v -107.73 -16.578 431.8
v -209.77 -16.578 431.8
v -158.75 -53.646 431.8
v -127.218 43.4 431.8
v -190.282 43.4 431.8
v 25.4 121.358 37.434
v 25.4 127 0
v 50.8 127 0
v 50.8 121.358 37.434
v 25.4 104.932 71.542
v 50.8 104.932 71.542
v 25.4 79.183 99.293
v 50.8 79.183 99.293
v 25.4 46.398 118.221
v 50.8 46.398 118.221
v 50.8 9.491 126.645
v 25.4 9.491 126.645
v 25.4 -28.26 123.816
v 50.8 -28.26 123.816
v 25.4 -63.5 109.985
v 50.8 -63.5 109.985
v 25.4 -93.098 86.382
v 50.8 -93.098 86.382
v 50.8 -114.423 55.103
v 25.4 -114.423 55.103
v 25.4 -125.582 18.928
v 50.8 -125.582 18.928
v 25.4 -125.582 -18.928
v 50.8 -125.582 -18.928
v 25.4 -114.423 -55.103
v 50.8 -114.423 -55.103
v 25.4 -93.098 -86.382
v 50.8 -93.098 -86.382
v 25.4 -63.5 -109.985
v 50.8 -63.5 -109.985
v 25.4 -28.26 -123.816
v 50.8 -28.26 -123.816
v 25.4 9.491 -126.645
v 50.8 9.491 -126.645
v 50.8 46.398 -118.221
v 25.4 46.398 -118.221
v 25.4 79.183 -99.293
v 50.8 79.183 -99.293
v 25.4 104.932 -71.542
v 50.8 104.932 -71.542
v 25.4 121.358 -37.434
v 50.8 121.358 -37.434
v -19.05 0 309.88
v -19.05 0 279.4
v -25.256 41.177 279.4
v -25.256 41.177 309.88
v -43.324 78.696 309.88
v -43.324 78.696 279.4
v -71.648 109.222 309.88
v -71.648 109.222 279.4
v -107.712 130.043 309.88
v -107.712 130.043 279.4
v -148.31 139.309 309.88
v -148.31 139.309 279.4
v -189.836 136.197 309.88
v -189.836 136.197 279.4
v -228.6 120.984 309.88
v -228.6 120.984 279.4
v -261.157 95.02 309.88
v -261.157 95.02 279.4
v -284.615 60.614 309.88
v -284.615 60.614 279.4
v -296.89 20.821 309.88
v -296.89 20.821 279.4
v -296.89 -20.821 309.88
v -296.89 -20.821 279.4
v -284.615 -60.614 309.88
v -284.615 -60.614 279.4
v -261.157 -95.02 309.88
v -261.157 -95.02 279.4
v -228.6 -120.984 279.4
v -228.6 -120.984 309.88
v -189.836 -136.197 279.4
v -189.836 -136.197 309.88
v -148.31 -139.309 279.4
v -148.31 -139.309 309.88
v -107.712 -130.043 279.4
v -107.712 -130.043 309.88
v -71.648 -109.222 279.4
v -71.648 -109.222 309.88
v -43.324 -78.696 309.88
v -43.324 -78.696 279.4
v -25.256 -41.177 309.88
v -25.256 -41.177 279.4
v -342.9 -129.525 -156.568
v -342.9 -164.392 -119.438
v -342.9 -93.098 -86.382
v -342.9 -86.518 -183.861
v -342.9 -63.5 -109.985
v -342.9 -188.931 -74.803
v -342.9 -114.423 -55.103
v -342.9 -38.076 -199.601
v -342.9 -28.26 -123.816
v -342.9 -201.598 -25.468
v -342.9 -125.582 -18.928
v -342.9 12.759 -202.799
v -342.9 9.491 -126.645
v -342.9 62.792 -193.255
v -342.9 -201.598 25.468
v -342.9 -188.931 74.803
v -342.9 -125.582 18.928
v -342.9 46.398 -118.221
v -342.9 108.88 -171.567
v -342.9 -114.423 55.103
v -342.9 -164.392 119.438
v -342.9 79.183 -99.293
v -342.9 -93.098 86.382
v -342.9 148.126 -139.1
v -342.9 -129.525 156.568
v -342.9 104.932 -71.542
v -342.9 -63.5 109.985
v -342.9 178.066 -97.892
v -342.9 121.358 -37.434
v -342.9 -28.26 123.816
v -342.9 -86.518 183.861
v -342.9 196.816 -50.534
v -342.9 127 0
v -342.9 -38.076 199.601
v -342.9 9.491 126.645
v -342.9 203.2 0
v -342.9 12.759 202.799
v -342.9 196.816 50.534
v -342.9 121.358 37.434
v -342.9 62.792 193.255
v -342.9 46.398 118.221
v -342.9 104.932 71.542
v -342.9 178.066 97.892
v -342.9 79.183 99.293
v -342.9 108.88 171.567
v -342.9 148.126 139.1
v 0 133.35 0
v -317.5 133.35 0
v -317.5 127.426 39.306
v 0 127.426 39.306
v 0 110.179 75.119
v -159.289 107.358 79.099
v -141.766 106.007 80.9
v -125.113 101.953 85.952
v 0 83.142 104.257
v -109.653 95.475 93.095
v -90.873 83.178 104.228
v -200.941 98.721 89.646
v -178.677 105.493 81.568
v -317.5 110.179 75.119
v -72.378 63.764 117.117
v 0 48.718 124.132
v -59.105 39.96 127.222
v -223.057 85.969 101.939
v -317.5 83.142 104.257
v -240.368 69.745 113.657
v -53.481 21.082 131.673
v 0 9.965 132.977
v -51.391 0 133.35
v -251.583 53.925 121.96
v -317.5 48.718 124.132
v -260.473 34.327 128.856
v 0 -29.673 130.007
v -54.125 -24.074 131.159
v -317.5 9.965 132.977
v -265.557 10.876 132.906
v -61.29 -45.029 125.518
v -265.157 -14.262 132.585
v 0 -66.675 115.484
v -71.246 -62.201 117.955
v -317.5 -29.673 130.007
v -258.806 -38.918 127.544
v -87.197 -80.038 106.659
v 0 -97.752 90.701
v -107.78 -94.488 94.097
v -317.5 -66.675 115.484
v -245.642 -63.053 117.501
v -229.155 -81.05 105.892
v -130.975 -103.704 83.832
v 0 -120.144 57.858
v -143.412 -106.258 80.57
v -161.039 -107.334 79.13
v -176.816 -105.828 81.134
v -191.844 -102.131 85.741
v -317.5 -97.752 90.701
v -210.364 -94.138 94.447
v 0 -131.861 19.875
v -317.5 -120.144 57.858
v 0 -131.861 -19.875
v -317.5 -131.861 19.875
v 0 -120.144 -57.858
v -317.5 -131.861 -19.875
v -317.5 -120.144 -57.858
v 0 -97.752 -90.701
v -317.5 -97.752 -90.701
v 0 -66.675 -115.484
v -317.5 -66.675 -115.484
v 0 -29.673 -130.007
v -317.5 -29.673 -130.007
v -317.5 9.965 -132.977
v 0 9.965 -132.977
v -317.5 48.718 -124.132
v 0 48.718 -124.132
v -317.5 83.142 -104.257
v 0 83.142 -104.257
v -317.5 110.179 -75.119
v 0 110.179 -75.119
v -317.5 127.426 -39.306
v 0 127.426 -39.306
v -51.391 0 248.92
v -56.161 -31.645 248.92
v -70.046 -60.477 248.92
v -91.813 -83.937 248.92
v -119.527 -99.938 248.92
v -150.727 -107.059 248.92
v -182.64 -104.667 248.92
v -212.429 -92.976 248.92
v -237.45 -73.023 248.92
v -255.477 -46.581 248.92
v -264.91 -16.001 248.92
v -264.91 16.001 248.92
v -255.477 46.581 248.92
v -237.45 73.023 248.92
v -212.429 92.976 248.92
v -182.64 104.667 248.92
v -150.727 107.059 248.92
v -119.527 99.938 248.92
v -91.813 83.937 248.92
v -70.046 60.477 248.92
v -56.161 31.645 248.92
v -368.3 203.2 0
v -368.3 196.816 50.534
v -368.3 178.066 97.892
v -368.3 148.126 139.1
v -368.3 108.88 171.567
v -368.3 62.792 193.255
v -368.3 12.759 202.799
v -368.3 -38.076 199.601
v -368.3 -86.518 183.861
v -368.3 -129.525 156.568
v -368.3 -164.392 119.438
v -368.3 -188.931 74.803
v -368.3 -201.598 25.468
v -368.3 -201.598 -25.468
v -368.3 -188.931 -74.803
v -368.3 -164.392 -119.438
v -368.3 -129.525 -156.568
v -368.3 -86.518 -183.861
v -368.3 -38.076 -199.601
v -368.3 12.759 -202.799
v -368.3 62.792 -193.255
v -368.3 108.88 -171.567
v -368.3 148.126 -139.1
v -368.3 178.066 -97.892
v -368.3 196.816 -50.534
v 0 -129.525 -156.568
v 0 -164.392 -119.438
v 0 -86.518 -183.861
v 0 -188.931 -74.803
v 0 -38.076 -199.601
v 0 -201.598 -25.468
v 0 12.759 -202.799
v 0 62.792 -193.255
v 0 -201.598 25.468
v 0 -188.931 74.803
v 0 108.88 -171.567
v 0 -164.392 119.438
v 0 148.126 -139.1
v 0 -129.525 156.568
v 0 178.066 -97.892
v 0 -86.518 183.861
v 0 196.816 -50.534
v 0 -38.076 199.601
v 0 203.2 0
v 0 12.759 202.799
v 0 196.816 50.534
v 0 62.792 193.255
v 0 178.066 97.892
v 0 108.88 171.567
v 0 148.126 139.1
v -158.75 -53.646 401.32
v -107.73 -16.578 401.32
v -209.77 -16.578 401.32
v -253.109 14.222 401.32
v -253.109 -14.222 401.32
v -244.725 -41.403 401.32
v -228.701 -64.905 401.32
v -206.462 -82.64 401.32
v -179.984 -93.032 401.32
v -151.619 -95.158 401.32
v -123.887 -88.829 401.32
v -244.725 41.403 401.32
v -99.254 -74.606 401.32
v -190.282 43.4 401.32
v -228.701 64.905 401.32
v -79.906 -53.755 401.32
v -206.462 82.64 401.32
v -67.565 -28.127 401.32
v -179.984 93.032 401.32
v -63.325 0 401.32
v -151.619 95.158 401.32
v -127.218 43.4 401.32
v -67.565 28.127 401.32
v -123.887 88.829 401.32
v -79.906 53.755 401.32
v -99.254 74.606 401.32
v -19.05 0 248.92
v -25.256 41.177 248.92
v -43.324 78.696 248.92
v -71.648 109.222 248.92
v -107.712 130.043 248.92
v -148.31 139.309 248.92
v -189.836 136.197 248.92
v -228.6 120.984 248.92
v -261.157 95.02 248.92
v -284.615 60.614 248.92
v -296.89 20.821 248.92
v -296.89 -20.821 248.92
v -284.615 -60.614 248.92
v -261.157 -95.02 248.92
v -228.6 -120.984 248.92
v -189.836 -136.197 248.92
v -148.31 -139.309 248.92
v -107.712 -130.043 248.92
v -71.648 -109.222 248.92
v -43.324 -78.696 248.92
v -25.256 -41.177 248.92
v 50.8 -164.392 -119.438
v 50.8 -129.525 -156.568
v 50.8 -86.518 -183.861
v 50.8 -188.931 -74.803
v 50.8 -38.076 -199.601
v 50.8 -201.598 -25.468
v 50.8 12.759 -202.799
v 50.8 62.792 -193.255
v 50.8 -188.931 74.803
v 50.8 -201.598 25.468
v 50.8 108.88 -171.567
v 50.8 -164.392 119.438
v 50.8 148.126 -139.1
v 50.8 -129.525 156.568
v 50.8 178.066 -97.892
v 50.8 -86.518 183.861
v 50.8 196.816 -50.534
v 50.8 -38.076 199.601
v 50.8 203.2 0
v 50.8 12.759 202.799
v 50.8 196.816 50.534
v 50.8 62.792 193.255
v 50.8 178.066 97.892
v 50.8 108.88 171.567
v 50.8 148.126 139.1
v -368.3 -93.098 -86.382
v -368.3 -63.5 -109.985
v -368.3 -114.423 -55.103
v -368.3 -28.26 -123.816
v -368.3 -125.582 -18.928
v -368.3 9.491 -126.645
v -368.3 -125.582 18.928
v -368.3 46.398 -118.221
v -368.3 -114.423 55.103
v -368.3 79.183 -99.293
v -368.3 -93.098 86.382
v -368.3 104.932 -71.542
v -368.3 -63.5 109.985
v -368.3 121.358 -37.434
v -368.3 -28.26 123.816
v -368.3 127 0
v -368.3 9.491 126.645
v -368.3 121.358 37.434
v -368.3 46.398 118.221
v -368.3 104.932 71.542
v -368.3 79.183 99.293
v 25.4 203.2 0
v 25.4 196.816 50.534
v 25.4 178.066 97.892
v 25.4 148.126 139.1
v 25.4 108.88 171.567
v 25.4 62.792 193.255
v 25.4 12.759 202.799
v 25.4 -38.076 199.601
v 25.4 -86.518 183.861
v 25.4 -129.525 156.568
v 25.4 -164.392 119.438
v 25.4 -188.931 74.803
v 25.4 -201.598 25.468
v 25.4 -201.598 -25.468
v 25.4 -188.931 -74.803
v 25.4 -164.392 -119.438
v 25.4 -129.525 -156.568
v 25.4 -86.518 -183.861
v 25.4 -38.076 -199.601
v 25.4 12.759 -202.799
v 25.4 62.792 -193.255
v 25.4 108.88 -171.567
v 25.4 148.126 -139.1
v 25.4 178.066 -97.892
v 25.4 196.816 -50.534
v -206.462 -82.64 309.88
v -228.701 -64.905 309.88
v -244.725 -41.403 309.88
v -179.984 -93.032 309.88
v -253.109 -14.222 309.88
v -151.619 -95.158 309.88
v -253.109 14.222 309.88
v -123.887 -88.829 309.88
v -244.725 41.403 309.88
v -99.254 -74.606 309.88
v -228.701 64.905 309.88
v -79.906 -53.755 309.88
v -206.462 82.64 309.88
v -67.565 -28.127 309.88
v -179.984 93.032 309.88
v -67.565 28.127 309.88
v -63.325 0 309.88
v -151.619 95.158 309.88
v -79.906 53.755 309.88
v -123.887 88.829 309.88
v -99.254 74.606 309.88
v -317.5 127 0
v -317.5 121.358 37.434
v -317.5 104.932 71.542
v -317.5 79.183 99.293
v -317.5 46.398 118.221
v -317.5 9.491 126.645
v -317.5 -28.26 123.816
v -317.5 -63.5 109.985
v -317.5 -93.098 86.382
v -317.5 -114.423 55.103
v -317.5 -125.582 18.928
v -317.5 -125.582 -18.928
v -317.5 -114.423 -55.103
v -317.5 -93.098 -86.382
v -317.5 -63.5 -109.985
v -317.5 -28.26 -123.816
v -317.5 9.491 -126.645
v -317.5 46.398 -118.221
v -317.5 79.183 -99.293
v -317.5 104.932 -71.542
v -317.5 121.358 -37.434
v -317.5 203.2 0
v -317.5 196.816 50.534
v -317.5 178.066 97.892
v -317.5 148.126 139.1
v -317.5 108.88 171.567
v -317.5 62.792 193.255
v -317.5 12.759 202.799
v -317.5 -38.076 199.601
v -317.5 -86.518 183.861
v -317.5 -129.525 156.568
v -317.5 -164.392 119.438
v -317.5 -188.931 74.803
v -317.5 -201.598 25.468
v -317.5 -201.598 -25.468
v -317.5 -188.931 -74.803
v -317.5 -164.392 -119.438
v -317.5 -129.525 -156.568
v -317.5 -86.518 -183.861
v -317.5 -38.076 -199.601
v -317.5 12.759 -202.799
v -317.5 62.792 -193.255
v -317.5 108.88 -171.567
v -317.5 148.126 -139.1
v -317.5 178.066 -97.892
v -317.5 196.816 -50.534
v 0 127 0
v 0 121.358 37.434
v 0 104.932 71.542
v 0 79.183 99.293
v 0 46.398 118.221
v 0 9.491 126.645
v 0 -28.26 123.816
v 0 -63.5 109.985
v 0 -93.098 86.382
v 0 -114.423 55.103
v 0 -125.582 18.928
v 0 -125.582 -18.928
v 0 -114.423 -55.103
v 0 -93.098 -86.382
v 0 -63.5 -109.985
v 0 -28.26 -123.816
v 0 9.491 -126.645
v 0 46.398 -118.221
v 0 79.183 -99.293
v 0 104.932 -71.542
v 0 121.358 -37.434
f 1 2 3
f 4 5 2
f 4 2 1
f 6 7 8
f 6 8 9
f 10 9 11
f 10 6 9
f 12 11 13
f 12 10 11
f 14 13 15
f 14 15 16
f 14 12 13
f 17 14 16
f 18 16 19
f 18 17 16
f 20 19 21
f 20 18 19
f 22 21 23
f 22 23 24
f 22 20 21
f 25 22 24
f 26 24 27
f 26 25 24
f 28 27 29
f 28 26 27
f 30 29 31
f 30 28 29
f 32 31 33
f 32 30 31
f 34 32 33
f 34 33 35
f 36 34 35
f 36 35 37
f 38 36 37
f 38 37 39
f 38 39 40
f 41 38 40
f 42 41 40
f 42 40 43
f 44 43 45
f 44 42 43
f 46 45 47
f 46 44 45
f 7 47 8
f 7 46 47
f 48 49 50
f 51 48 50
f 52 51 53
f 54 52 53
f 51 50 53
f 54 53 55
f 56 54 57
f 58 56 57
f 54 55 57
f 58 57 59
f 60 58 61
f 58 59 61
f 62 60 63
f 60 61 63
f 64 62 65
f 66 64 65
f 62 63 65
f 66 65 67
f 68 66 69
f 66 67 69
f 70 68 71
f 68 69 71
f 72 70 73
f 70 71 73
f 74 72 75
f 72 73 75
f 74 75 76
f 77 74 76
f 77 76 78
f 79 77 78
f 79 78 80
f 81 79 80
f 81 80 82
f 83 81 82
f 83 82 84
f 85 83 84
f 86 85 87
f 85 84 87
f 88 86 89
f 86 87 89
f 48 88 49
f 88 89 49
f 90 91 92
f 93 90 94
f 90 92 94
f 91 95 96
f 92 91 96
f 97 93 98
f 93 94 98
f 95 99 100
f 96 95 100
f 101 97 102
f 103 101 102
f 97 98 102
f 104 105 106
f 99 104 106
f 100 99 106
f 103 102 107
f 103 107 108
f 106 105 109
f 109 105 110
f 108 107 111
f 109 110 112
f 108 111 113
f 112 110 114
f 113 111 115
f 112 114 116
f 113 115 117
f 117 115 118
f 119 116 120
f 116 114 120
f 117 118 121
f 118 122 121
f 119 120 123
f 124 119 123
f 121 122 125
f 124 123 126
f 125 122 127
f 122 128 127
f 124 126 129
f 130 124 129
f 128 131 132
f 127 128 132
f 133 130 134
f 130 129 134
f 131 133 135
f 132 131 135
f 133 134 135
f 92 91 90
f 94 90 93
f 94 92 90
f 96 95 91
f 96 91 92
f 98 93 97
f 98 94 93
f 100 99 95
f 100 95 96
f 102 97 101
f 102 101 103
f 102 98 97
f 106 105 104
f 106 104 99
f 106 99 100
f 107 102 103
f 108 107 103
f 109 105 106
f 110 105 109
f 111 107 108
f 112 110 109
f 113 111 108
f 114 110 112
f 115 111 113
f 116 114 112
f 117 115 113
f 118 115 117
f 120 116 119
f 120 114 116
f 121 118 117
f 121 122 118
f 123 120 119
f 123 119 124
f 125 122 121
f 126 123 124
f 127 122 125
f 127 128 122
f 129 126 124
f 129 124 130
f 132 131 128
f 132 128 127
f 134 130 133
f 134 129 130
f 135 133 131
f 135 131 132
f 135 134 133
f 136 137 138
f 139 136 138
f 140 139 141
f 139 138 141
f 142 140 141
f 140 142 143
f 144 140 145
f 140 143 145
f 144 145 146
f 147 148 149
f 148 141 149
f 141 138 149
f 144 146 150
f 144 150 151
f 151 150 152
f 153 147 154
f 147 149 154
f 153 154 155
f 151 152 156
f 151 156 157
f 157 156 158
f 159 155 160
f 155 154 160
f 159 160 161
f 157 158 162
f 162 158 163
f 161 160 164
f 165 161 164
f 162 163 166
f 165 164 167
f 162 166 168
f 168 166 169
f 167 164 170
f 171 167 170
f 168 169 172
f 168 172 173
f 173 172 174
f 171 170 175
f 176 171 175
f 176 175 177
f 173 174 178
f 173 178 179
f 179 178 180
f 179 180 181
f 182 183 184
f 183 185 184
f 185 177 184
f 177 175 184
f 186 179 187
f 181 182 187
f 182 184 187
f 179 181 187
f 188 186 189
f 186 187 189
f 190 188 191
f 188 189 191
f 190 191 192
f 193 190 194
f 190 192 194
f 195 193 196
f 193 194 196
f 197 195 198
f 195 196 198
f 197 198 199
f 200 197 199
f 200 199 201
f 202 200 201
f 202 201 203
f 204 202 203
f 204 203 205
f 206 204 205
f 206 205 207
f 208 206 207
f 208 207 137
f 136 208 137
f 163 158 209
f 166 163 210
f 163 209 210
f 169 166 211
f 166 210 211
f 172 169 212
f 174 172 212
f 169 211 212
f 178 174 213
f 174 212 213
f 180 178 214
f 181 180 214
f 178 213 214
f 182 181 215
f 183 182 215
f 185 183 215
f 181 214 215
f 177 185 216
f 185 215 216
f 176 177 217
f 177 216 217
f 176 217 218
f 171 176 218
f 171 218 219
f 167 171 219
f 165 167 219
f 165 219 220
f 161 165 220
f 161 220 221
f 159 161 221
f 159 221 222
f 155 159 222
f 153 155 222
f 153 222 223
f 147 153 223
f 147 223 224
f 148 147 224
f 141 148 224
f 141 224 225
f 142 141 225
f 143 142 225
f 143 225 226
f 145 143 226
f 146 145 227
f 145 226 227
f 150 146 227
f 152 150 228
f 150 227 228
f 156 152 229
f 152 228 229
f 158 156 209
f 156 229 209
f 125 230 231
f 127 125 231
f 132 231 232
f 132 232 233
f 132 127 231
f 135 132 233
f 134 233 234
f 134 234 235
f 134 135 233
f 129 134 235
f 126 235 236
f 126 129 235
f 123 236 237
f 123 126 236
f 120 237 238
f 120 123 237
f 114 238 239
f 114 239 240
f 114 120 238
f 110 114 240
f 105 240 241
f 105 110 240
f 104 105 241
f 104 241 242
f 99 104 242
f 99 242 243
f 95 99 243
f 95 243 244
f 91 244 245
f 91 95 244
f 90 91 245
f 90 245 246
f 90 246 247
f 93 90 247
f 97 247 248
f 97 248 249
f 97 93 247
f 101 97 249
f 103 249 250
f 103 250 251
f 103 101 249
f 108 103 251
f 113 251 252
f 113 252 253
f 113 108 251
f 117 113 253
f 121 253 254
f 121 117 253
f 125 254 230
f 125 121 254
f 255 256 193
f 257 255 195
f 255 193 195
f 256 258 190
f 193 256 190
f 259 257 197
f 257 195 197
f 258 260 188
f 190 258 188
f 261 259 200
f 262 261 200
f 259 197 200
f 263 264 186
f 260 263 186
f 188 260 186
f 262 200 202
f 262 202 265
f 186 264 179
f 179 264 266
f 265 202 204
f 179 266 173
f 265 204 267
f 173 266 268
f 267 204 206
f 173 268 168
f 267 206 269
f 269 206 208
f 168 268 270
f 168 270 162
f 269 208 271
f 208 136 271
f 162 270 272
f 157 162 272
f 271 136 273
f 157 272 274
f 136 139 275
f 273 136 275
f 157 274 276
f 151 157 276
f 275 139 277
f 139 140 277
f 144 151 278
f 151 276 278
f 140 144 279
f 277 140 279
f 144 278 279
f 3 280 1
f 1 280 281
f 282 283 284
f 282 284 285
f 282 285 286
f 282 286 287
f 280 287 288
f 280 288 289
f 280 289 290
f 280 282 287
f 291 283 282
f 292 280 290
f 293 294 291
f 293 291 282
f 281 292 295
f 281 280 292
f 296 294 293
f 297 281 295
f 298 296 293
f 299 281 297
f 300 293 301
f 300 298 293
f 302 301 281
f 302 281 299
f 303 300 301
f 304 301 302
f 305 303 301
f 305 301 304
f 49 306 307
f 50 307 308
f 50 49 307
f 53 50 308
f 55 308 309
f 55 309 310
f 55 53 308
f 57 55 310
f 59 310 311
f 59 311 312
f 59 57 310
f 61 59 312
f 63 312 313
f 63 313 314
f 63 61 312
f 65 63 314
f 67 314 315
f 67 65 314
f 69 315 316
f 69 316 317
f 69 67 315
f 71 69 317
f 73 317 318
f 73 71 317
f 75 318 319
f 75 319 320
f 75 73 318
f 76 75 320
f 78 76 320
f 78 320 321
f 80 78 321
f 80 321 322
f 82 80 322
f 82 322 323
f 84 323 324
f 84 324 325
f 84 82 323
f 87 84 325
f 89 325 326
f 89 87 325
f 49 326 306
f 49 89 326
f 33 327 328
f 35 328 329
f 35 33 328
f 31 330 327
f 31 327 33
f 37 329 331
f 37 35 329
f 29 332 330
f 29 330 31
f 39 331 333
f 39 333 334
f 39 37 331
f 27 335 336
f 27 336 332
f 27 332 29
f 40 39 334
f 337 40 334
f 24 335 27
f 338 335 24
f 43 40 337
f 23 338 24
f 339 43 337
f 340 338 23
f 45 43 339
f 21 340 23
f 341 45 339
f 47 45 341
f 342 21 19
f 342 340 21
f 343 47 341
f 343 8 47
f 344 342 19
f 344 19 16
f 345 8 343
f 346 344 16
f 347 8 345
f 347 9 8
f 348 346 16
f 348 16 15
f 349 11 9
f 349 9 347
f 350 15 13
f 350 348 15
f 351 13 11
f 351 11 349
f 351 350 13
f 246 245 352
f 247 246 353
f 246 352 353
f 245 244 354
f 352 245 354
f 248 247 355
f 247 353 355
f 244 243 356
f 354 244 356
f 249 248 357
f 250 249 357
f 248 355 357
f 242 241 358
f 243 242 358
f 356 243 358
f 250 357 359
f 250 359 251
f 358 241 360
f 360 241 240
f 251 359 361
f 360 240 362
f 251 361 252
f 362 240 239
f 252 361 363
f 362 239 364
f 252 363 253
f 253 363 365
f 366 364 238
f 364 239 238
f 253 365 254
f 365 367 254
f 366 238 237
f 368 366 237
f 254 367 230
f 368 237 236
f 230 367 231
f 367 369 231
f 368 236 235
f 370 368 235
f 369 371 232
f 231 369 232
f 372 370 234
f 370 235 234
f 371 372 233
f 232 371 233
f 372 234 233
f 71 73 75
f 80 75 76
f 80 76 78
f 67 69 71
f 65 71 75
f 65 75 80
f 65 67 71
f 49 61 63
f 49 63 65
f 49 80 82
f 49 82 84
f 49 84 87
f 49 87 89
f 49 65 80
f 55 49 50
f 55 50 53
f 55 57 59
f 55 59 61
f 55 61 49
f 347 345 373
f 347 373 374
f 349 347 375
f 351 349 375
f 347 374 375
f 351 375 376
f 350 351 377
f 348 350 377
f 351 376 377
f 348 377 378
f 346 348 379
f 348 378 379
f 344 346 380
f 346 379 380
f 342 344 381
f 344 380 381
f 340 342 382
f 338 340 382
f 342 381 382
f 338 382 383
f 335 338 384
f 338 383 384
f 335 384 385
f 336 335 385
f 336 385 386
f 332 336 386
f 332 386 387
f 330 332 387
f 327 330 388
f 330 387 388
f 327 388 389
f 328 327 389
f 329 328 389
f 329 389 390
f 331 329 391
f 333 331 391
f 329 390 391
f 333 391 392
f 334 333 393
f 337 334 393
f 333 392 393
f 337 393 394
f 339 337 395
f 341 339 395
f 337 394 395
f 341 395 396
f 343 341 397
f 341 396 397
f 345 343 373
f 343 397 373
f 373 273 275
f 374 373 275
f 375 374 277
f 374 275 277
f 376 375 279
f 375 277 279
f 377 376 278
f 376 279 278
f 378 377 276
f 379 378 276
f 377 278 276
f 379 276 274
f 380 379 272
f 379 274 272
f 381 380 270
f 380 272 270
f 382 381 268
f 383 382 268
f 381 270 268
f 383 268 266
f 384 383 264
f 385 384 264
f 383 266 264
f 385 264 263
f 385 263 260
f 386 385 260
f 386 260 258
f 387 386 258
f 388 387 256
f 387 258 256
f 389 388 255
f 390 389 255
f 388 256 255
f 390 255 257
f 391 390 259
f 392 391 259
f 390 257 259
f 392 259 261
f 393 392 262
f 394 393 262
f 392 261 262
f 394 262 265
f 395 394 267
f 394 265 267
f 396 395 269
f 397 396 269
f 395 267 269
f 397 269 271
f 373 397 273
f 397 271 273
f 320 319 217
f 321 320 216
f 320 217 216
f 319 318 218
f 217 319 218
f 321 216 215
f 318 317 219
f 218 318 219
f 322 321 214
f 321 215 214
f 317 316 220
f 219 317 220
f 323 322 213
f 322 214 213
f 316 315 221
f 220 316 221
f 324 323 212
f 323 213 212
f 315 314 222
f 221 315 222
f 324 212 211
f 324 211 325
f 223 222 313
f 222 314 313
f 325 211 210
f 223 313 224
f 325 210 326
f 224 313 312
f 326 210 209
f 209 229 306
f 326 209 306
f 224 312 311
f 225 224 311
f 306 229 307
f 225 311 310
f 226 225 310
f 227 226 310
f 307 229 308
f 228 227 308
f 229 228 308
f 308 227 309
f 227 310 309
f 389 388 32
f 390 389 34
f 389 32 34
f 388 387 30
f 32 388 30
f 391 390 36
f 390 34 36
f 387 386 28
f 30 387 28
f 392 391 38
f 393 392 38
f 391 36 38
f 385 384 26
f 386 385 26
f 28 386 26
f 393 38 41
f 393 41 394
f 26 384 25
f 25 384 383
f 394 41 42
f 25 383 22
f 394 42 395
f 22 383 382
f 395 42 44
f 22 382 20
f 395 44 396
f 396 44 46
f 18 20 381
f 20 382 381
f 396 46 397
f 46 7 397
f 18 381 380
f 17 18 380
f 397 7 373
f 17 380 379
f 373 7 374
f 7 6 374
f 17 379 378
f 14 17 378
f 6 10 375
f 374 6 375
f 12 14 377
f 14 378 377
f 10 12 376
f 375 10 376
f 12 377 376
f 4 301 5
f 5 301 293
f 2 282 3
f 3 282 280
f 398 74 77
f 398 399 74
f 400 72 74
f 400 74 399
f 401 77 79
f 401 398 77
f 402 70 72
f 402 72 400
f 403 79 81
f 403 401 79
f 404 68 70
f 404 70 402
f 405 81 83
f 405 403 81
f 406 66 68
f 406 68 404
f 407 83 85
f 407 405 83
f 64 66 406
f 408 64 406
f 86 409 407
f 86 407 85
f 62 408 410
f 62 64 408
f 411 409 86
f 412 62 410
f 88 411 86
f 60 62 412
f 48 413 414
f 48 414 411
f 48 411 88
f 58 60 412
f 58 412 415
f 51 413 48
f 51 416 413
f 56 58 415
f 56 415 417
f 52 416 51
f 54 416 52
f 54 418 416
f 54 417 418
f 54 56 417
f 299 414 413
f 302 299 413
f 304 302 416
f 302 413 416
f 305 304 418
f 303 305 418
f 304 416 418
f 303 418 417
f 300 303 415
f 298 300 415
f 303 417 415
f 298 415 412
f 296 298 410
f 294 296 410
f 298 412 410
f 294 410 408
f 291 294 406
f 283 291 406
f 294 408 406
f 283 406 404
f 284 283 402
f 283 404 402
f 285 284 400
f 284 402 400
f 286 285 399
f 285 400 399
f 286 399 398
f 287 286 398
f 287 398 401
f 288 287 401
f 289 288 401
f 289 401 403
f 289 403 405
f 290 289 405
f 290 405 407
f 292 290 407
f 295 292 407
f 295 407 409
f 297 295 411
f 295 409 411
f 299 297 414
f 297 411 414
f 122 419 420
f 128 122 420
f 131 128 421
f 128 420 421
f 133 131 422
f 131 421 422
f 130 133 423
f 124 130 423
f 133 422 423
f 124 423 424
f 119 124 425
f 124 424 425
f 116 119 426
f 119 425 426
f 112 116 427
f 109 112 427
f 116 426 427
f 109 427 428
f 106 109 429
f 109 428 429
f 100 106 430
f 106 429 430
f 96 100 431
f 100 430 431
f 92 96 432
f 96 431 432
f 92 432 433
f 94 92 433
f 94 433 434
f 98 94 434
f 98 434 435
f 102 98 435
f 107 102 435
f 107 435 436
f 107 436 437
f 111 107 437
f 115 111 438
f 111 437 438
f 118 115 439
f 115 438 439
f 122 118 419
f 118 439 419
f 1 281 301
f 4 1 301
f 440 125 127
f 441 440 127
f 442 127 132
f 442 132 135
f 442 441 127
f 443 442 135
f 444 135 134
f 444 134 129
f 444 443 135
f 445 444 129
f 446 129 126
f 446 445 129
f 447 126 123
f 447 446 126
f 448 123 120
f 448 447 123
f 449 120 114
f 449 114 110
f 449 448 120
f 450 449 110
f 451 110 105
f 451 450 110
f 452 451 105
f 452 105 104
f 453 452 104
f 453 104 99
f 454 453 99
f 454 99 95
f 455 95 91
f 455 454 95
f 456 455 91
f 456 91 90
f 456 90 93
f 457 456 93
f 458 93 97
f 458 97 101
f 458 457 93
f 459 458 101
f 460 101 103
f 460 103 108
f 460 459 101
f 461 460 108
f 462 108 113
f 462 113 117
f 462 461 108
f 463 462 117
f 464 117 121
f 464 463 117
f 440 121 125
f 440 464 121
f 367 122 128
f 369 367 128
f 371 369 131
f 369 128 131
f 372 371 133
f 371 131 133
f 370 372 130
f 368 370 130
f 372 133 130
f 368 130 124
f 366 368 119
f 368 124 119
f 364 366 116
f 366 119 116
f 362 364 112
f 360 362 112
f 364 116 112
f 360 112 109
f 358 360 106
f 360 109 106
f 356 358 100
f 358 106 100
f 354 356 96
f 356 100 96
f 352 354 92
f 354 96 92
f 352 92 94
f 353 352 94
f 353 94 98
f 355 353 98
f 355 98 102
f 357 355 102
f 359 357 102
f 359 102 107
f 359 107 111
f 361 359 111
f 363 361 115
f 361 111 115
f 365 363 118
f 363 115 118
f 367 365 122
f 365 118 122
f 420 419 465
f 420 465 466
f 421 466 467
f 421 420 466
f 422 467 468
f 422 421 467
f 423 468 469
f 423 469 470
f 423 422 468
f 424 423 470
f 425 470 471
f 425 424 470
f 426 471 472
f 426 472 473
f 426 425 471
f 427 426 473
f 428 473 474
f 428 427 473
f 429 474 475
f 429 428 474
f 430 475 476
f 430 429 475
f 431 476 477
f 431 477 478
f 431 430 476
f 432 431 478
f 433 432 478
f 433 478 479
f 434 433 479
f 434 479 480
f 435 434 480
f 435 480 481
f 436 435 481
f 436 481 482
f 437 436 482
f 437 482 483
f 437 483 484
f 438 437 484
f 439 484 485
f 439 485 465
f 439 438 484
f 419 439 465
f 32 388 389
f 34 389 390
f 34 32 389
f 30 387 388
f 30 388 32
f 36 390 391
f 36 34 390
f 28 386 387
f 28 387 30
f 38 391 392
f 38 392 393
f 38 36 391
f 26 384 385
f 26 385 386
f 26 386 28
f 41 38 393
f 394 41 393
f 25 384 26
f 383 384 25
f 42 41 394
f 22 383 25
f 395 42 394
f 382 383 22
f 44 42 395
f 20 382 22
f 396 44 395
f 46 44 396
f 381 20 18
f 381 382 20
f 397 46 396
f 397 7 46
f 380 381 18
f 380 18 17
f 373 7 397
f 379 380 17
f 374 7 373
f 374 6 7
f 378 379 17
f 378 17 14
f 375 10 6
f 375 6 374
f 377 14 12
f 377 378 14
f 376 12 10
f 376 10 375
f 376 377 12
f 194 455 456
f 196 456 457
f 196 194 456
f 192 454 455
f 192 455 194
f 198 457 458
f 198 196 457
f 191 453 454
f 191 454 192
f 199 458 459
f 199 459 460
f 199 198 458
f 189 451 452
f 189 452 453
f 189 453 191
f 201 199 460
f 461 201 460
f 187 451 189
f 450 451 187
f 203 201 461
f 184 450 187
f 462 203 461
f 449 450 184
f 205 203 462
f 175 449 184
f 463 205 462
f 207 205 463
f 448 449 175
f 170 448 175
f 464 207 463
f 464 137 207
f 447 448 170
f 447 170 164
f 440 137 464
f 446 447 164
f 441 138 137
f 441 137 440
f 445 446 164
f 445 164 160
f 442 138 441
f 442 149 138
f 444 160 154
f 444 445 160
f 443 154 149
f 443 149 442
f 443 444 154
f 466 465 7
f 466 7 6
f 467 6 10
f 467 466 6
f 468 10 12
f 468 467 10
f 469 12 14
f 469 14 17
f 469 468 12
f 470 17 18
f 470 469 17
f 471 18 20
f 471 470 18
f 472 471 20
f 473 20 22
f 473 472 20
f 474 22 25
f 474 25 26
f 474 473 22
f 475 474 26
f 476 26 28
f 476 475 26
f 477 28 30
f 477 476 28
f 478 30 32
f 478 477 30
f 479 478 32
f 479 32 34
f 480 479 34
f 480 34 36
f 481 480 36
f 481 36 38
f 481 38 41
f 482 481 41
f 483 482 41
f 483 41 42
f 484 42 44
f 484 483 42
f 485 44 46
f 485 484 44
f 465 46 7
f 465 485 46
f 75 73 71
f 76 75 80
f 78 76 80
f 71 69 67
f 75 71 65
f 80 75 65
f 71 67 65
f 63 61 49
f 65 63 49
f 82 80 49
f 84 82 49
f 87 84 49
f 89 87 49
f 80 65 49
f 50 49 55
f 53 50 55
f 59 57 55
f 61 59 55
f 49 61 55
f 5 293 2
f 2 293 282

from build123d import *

# Parameters (mm, degrees)
F0_R      = 203.2
F0_R_2    = 127
F1_DEPTH  = 25.4
F3_R      = 203.2
F3_R_2    = 127
F4_DEPTH  = 25.4
F6_DEPTH  = 25.4
F7_DEPTH  = 25.4
F9_R      = 133.35
F9_R_2    = 127
F10_DEPTH = 317.5
F12_R     = 139.7
F13_DEPTH = 30.48
F14_R     = 107.3588969204
F15_REACH = 755.7778161324
F16_DEPTH = 30.48
F17_R     = 95.4249040927
F18_DEPTH = 91.44
F20_DEPTH = 30.48


with BuildPart() as f1:
    # F0 (on Right) → F1 (new body)
    with BuildSketch(Plane.YZ):
        Circle(F0_R)
        Circle(F0_R_2, mode=Mode.SUBTRACT)
    extrude(amount=F1_DEPTH)


with BuildPart() as f4:
    # F3 (on offset) → F4 (new body)
    with BuildSketch(Plane.YZ.offset(-317.5)):
        Circle(F3_R)
        Circle(F3_R_2, mode=Mode.SUBTRACT)
    extrude(amount=-F4_DEPTH)


with BuildPart() as f6:
    # F6 (new): a face of the model
    f6_faces = [f4.part.faces().sort_by_distance(p)[0] for p in [
        (-342.9, -197.4526360825, 0),
    ]]
    extrude(f6_faces, amount=F6_DEPTH)


with BuildPart() as f7:
    # F7 (new): a face of the model
    f7_faces = [f1.part.faces().sort_by_distance(p)[0] for p in [
        (25.4, -197.4526360825, 0),
    ]]
    extrude(f7_faces, amount=F7_DEPTH)


with BuildPart() as f1_1:
    add(f1.part)

    add(f4.part)  # F10 merges F4
    # F9 (on face) → F10 (join, through all)
    with BuildSketch(Plane.YZ.offset(-317.5)):
        Circle(F9_R)
        Circle(F9_R_2, mode=Mode.SUBTRACT)
    extrude(amount=F10_DEPTH)



with BuildPart() as f13:
    # F12 (on offset) → F13 (new body)
    with BuildSketch(Plane.XY.offset(279.4)):
        with Locations((-158.75, 0)):
            Circle(F12_R)
    extrude(amount=-F13_DEPTH)


with BuildPart() as f1_2:
    add(f1_1.part)

    add(f13.part)  # F15 merges F13
    f15_end = f1_2.faces().sort_by_distance((-158.75, -133.35, 0))[0]
    # F14 (on face) → F15 (join, up to a face of the model that its end follows)
    with BuildSketch(Plane(origin=(0, 0, 248.92), x_dir=(1, 0, 0), z_dir=(0, 0, -1))):
        with Locations((-158.75, 0)):
            Circle(F14_R)
    f15_long = extrude(amount=F15_REACH, mode=Mode.PRIVATE)
    add(split(f15_long, bisect_by=f15_end, keep=Keep.ALL, mode=Mode.PRIVATE).solids().sort_by_distance((-158.75, 0, 248.92))[0])


with BuildPart() as f16:
    # F16 (new): a face of the model
    f16_faces = [f1_2.part.faces().sort_by_distance(p)[0] for p in [
        (-158.75, 0, 279.4),
    ]]
    extrude(f16_faces, amount=F16_DEPTH)

    # F17 (on face) → F18 (join)
    with BuildSketch(Plane.XY.offset(309.88)):
        with Locations((-158.75, 0)):
            Circle(F17_R)
    extrude(amount=F18_DEPTH)

    # F19 (on face) → F20 (join)
    with BuildSketch(Plane.XY.offset(401.32)):
        Polygon((-127.2176910353, 43.4004999697), (-190.2823089647, 43.4004999697), (-209.7703476486, -16.5775158597), (-158.75, -53.6459682201), (-107.7296523514, -16.5775158597), align=None)
    extrude(amount=F20_DEPTH)


solid = Compound([f6.part, f7.part, f1_2.part, f16.part])
